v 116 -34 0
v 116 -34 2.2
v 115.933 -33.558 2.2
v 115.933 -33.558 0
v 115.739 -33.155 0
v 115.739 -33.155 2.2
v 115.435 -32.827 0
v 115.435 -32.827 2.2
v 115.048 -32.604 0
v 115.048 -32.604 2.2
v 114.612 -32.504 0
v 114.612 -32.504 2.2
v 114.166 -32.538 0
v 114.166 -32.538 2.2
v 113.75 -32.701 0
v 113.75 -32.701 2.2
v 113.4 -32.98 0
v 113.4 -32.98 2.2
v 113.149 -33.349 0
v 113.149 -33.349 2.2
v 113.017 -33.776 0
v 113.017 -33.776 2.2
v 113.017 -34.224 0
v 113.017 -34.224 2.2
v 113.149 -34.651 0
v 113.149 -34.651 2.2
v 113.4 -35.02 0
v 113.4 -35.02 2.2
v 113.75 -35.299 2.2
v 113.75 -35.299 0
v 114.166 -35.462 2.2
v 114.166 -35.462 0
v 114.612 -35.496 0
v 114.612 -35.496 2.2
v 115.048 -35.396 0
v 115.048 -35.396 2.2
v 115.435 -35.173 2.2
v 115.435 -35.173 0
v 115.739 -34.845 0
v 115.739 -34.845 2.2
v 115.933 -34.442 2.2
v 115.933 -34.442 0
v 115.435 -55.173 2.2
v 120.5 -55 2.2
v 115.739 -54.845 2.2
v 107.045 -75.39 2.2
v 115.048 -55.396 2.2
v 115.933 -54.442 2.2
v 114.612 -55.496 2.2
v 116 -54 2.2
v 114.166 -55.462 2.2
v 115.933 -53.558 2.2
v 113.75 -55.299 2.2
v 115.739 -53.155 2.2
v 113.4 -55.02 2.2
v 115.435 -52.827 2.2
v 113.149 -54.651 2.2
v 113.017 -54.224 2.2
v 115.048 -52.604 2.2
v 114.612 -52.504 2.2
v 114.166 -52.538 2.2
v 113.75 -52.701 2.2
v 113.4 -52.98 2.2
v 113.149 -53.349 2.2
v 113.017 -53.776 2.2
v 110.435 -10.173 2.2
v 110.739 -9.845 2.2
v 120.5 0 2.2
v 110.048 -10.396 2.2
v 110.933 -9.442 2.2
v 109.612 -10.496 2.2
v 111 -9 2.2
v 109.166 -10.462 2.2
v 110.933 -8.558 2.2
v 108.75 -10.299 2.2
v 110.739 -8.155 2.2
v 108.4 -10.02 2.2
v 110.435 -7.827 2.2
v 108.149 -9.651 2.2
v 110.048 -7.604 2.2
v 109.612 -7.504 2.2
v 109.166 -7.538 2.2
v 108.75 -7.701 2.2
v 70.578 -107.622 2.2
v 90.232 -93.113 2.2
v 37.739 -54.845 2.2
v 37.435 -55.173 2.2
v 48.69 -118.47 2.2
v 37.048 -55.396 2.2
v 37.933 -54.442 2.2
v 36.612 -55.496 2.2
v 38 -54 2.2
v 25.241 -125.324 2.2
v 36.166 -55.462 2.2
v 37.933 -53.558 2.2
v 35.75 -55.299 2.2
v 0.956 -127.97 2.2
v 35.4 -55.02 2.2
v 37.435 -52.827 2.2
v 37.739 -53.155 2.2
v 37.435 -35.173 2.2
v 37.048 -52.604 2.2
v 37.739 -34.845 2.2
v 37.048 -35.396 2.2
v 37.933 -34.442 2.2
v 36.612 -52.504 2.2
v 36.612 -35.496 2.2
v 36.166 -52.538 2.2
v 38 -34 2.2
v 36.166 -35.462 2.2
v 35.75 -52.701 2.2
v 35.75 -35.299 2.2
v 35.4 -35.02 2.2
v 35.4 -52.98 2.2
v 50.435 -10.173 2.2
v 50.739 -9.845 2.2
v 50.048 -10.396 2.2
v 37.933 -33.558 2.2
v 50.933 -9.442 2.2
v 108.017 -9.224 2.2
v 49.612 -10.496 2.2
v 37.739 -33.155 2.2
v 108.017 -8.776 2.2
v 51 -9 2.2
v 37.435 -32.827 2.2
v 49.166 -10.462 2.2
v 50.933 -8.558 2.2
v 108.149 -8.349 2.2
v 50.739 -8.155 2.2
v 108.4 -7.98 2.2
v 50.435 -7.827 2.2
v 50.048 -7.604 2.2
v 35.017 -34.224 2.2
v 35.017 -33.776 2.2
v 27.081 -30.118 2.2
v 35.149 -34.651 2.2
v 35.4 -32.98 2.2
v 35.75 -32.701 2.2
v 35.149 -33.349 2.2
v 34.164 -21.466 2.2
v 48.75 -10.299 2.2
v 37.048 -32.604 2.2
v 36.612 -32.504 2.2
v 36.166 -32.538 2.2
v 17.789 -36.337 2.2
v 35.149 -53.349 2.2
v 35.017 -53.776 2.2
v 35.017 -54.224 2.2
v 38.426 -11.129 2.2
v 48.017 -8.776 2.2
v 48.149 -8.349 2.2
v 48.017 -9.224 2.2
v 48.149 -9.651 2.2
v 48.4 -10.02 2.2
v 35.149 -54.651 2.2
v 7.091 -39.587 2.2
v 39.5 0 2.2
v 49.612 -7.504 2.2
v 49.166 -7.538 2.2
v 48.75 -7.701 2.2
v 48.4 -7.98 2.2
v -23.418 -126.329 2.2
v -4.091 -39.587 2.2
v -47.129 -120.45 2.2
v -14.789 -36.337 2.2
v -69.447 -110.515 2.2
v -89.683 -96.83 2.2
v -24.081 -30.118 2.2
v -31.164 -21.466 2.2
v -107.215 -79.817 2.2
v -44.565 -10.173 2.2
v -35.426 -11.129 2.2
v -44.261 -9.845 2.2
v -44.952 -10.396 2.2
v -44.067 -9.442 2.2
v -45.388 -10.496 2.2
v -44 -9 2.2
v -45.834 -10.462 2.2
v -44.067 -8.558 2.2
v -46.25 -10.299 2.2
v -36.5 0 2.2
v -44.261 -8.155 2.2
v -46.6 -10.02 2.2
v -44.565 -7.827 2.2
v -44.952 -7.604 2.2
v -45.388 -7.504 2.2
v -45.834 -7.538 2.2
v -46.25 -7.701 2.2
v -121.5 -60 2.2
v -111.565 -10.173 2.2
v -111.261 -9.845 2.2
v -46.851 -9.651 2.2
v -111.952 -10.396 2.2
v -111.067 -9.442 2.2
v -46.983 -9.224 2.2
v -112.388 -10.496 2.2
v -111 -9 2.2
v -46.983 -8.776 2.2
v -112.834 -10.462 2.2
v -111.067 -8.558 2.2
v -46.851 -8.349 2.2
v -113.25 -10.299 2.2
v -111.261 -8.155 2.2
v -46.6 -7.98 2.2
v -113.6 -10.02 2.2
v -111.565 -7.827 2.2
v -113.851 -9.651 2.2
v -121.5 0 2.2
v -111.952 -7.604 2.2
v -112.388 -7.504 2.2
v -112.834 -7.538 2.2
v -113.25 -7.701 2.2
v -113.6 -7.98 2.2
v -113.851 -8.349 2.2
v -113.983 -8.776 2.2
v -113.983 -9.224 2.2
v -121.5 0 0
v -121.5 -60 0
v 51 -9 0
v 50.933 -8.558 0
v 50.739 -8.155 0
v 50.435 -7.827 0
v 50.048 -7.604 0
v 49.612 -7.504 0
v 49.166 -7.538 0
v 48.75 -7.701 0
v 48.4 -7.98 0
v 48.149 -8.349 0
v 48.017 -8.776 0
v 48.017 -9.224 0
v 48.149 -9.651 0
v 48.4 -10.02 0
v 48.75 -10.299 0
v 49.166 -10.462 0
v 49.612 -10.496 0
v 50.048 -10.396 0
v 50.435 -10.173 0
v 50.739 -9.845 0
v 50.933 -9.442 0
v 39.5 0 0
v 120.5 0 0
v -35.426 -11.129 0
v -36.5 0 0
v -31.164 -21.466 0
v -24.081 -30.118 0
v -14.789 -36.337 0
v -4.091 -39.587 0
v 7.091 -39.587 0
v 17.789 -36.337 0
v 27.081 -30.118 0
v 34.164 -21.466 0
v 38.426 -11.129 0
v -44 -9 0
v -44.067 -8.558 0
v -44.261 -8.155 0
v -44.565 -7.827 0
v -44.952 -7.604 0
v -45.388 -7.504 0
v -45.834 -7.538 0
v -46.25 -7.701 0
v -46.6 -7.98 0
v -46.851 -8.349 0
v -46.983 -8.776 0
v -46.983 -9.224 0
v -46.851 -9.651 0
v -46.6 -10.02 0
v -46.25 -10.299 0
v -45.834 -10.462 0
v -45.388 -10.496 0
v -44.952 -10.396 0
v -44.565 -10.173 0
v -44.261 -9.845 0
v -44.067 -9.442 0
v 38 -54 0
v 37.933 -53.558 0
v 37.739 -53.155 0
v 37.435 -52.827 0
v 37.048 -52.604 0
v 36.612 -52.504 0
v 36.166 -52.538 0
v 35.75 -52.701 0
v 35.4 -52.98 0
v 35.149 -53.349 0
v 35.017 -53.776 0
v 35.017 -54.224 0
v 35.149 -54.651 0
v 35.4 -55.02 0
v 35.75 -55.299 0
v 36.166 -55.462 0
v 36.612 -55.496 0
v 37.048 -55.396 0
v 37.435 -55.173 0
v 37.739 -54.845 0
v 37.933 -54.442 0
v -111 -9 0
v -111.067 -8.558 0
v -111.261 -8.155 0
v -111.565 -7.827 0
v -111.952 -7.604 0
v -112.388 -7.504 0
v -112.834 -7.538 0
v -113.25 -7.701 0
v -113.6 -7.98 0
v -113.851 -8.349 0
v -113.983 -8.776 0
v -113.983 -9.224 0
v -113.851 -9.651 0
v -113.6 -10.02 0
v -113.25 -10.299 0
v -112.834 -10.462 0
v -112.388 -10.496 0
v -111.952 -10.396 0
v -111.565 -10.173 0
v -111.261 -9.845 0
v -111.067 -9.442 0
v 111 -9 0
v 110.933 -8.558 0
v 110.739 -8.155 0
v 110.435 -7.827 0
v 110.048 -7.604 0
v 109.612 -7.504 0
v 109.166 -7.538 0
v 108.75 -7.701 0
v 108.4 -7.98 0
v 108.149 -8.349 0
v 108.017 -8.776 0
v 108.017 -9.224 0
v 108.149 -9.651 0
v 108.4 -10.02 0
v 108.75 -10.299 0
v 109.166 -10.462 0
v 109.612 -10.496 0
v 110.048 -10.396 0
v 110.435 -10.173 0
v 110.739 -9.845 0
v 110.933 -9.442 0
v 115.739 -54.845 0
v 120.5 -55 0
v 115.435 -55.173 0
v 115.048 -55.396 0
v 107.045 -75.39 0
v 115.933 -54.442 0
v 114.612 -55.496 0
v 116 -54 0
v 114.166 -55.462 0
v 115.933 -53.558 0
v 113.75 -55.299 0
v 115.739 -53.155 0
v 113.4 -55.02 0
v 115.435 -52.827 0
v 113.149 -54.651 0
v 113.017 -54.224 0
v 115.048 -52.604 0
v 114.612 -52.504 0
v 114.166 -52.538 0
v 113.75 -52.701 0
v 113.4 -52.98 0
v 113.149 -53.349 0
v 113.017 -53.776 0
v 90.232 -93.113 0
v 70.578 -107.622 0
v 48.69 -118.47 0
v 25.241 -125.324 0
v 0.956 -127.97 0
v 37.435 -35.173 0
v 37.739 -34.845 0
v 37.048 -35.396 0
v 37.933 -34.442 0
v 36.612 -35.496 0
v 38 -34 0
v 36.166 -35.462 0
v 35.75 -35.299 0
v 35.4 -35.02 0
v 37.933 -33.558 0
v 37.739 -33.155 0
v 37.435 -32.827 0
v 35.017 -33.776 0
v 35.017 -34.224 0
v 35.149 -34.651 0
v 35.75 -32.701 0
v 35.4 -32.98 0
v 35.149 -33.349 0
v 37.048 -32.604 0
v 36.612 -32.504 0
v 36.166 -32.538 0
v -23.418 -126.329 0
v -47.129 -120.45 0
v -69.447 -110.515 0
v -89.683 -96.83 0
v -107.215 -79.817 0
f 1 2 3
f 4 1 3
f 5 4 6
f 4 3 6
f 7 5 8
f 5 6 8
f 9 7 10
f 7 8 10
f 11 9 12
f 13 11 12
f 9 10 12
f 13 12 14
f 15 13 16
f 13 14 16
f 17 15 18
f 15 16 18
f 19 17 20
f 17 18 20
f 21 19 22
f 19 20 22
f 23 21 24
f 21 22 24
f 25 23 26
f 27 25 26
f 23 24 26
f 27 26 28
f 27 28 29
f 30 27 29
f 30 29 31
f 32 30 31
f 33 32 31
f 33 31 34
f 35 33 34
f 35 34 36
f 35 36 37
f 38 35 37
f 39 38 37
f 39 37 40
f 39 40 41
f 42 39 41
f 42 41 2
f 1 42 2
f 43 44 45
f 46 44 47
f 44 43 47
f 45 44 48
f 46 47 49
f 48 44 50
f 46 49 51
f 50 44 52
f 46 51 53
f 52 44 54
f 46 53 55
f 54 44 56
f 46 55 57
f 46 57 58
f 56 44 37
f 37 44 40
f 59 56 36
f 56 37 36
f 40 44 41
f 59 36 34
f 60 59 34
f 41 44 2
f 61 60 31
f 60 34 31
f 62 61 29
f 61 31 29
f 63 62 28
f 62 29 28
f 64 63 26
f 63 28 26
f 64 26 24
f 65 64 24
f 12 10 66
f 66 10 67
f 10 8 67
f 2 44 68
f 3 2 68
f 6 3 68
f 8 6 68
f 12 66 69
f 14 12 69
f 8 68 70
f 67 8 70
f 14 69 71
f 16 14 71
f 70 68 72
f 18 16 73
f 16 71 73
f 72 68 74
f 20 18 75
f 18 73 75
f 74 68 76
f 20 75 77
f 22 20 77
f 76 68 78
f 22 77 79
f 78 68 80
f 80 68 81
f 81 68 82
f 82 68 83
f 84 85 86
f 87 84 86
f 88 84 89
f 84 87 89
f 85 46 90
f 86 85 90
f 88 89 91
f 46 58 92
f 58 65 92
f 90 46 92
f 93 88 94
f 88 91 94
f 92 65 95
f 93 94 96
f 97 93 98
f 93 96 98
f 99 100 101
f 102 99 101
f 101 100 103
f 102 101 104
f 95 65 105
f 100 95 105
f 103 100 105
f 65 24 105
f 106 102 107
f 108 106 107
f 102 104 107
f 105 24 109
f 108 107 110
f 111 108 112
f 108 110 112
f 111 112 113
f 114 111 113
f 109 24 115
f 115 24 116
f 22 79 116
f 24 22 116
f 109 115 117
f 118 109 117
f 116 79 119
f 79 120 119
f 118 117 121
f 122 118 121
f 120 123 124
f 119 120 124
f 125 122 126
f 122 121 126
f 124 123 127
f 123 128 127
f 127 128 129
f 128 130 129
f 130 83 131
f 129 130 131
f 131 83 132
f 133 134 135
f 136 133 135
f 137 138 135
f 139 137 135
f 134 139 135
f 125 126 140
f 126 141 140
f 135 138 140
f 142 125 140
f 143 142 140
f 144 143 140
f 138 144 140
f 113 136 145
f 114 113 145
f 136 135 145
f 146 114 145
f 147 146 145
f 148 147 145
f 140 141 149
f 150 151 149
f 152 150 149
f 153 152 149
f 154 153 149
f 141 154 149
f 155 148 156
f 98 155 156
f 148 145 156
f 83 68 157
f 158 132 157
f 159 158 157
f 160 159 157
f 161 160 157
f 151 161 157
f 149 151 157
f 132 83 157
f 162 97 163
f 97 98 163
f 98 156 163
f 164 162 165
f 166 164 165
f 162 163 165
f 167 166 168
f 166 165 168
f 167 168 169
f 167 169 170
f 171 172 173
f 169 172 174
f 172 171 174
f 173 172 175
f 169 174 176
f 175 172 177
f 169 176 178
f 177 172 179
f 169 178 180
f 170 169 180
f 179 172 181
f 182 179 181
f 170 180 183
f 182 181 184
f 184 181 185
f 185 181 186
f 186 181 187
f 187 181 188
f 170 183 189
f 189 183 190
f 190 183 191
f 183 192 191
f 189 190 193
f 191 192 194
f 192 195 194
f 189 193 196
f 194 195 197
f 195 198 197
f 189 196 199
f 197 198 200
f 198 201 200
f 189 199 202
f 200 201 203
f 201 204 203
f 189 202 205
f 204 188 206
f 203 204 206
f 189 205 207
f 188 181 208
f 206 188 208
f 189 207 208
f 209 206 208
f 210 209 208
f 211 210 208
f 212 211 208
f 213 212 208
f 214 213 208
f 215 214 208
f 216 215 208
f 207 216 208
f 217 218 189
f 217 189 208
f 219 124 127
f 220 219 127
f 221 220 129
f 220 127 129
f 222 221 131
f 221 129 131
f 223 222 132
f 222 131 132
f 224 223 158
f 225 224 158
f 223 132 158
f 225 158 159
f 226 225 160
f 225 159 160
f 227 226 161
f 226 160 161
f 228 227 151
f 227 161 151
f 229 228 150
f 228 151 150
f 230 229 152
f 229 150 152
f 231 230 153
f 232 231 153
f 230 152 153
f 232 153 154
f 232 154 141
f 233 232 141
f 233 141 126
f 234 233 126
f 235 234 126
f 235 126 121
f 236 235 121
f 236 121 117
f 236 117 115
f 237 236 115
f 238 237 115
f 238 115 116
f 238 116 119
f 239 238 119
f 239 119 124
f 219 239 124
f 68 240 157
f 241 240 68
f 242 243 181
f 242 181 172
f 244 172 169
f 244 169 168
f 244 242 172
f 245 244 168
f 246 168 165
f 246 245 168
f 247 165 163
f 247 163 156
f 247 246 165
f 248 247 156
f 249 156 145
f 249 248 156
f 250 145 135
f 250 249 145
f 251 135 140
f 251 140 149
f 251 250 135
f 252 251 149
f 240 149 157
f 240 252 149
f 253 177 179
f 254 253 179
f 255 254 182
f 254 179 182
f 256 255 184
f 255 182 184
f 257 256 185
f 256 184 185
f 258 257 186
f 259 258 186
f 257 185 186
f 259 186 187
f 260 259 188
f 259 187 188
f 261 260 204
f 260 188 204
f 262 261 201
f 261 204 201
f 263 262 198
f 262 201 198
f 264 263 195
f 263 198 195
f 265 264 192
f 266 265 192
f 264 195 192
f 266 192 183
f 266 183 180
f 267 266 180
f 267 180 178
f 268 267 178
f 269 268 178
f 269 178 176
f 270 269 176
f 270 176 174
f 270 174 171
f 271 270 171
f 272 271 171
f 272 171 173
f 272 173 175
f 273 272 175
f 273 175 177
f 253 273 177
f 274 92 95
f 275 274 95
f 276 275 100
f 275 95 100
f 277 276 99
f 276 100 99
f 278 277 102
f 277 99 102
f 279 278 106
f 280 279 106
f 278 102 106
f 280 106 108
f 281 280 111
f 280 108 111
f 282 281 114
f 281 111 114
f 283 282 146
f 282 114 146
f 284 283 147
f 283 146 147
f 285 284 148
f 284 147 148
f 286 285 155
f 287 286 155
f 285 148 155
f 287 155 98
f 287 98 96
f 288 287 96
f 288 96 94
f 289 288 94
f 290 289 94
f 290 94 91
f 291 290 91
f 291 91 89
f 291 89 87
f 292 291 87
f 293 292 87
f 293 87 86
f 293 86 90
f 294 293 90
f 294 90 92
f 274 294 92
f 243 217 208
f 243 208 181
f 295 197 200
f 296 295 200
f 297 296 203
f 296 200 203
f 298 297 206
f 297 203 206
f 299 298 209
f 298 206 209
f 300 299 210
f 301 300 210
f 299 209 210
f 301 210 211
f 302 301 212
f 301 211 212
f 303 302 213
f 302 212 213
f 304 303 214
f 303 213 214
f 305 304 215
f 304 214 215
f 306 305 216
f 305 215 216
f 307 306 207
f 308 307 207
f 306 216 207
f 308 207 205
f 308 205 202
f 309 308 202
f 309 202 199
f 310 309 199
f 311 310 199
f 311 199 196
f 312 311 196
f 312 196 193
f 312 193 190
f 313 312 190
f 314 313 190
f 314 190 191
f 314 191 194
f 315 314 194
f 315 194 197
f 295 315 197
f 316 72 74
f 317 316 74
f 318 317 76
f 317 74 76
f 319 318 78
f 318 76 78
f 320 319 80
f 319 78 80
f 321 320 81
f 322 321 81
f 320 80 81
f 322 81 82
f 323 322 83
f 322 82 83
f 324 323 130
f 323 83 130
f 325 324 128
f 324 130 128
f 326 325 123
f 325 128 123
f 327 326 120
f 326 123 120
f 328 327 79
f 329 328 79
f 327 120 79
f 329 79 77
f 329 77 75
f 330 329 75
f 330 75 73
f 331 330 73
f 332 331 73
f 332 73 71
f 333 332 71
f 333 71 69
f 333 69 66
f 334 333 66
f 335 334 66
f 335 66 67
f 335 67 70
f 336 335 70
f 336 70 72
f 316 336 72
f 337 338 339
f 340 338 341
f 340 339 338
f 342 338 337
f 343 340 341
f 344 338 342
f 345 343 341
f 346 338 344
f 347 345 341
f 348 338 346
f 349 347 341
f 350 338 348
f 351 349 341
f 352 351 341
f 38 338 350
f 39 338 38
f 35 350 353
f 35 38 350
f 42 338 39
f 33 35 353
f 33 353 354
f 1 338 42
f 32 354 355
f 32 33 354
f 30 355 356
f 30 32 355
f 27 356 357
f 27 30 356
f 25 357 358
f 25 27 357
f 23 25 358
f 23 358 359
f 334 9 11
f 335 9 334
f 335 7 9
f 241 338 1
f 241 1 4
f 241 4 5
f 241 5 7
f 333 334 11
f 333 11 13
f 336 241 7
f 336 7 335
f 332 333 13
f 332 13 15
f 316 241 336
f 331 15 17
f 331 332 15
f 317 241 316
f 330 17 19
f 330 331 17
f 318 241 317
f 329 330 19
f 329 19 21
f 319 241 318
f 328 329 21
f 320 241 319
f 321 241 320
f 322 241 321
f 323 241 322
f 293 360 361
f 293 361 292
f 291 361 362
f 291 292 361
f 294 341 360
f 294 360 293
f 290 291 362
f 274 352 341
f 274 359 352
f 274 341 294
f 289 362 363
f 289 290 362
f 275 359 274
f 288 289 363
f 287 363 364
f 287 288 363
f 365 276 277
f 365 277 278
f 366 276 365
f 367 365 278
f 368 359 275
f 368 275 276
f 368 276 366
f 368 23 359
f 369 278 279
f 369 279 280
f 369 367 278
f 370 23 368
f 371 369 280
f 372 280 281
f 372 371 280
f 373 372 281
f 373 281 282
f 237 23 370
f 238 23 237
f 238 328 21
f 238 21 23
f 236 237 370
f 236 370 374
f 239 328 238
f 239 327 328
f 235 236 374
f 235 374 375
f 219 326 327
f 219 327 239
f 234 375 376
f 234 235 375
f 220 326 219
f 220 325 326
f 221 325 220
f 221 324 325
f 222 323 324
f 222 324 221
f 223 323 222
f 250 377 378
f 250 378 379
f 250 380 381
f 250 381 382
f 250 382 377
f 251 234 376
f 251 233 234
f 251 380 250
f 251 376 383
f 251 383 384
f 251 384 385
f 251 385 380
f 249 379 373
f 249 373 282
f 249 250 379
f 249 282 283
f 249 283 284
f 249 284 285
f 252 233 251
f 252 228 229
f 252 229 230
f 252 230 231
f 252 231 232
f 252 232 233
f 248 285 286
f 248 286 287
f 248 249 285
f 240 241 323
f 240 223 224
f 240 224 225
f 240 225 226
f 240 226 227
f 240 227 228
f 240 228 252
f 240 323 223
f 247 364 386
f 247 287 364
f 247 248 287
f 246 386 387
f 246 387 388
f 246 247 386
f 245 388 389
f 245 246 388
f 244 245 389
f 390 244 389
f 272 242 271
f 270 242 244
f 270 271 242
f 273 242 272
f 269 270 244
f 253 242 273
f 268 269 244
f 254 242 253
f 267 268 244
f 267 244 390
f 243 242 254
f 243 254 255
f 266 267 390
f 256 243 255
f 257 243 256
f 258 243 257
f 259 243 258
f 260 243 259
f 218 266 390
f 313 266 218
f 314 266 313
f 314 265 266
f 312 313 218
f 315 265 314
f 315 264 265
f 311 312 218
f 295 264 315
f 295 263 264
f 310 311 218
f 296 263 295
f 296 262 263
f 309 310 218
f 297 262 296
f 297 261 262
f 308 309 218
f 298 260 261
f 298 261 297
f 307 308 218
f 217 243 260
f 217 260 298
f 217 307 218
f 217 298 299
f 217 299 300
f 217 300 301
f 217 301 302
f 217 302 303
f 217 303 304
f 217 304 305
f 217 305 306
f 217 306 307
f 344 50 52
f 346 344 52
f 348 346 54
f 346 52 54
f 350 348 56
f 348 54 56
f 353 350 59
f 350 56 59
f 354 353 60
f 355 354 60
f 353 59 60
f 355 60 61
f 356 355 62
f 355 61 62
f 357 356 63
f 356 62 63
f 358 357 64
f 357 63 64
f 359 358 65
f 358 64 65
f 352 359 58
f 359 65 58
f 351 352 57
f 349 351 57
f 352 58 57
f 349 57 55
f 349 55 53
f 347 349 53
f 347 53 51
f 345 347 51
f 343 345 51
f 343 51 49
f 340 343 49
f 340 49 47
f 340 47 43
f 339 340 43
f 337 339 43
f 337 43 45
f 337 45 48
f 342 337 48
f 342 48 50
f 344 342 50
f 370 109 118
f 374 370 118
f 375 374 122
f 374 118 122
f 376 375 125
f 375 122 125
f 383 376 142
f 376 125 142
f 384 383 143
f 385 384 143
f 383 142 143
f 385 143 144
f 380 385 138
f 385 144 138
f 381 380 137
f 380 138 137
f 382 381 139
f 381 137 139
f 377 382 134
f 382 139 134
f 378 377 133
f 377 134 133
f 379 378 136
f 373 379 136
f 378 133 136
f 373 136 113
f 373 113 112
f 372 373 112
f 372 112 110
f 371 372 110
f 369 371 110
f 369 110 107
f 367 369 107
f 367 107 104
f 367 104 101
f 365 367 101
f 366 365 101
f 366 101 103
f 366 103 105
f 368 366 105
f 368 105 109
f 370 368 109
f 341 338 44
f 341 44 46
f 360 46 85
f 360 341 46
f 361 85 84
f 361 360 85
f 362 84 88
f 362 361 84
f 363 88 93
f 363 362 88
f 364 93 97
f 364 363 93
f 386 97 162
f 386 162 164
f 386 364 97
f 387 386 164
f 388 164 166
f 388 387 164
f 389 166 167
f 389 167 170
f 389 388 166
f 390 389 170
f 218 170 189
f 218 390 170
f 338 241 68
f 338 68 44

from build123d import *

# Parameters (mm, degrees)
BOSS_EXTRUDE1_DEPTH = 2.2
CUT_EXTRUDE1_REACH  = 178.497
SKETCH4_R           = 1.5
CUT_EXTRUDE2_REACH  = 178.497
SKETCH5_R           = 1.5


with BuildPart() as part:
    # Sketch2 → Boss-Extrude1 (new body)
    with BuildSketch(Plane.XY):
        with BuildLine():
            Line((-121.5, 0), (-36.5, 0))
            ThreePointArc((-36.5, 0), (1.5, -40), (39.5, 0))
            Line((39.5, 0), (120.5, 0))
            Line((120.5, 0), (120.5, -55))
            ThreePointArc((120.5, -55), (0.955998142, -127.970310059), (-121.5, -60))
            Line((-121.5, -60), (-121.5, 0))
        make_face()
    extrude(amount=BOSS_EXTRUDE1_DEPTH)

    # Sketch4 → Cut-Extrude1 (cut, up to next)
    with BuildSketch(Plane.XY.offset(2.2), mode=Mode.PRIVATE) as cut_extrude1_sk1:
        with Locations((109.5, -9)):
            Circle(SKETCH4_R)
    cut_extrude1_tool1 = extrude(cut_extrude1_sk1.sketch, amount=-CUT_EXTRUDE1_REACH, mode=Mode.PRIVATE) & part.part
    # Sketch4 → Cut-Extrude1 (cut, up to next)
    with BuildSketch(Plane.XY.offset(2.2), mode=Mode.PRIVATE) as cut_extrude1_sk2:
        with Locations((49.5, -9)):
            Circle(SKETCH4_R)
    cut_extrude1_tool2 = extrude(cut_extrude1_sk2.sketch, amount=-CUT_EXTRUDE1_REACH, mode=Mode.PRIVATE) & part.part
    # Sketch4 → Cut-Extrude1 (cut, up to next)
    with BuildSketch(Plane.XY.offset(2.2), mode=Mode.PRIVATE) as cut_extrude1_sk3:
        with Locations((-45.5, -9)):
            Circle(SKETCH4_R)
    cut_extrude1_tool3 = extrude(cut_extrude1_sk3.sketch, amount=-CUT_EXTRUDE1_REACH, mode=Mode.PRIVATE) & part.part
    # Sketch4 → Cut-Extrude1 (cut, up to next)
    with BuildSketch(Plane.XY.offset(2.2), mode=Mode.PRIVATE) as cut_extrude1_sk4:
        with Locations((-112.5, -9)):
            Circle(SKETCH4_R)
    cut_extrude1_tool4 = extrude(cut_extrude1_sk4.sketch, amount=-CUT_EXTRUDE1_REACH, mode=Mode.PRIVATE) & part.part
    add(cut_extrude1_tool1.solids().sort_by_distance((109.5, -9, 2.2))[0], mode=Mode.SUBTRACT)
    add(cut_extrude1_tool2.solids().sort_by_distance((49.5, -9, 2.2))[0], mode=Mode.SUBTRACT)
    add(cut_extrude1_tool3.solids().sort_by_distance((-45.5, -9, 2.2))[0], mode=Mode.SUBTRACT)
    add(cut_extrude1_tool4.solids().sort_by_distance((-112.5, -9, 2.2))[0], mode=Mode.SUBTRACT)

    # Sketch5 → Cut-Extrude2 (cut, up to next)
    with BuildSketch(Plane.XY.offset(2.2), mode=Mode.PRIVATE) as cut_extrude2_sk1:
        with Locations((114.5, -34)):
            Circle(SKETCH5_R)
    cut_extrude2_tool1 = extrude(cut_extrude2_sk1.sketch, amount=-CUT_EXTRUDE2_REACH, mode=Mode.PRIVATE) & part.part
    # Sketch5 → Cut-Extrude2 (cut, up to next)
    with BuildSketch(Plane.XY.offset(2.2), mode=Mode.PRIVATE) as cut_extrude2_sk2:
        with Locations((114.5, -54)):
            Circle(SKETCH5_R)
    cut_extrude2_tool2 = extrude(cut_extrude2_sk2.sketch, amount=-CUT_EXTRUDE2_REACH, mode=Mode.PRIVATE) & part.part
    # Sketch5 → Cut-Extrude2 (cut, up to next)
    with BuildSketch(Plane.XY.offset(2.2), mode=Mode.PRIVATE) as cut_extrude2_sk3:
        with Locations((36.5, -34)):
            Circle(SKETCH5_R)
    cut_extrude2_tool3 = extrude(cut_extrude2_sk3.sketch, amount=-CUT_EXTRUDE2_REACH, mode=Mode.PRIVATE) & part.part
    # Sketch5 → Cut-Extrude2 (cut, up to next)
    with BuildSketch(Plane.XY.offset(2.2), mode=Mode.PRIVATE) as cut_extrude2_sk4:
        with Locations((36.5, -54)):
            Circle(SKETCH5_R)
    cut_extrude2_tool4 = extrude(cut_extrude2_sk4.sketch, amount=-CUT_EXTRUDE2_REACH, mode=Mode.PRIVATE) & part.part
    add(cut_extrude2_tool1.solids().sort_by_distance((114.5, -34, 2.2))[0], mode=Mode.SUBTRACT)
    add(cut_extrude2_tool2.solids().sort_by_distance((114.5, -54, 2.2))[0], mode=Mode.SUBTRACT)
    add(cut_extrude2_tool3.solids().sort_by_distance((36.5, -34, 2.2))[0], mode=Mode.SUBTRACT)
    add(cut_extrude2_tool4.solids().sort_by_distance((36.5, -54, 2.2))[0], mode=Mode.SUBTRACT)


solid = part.part
